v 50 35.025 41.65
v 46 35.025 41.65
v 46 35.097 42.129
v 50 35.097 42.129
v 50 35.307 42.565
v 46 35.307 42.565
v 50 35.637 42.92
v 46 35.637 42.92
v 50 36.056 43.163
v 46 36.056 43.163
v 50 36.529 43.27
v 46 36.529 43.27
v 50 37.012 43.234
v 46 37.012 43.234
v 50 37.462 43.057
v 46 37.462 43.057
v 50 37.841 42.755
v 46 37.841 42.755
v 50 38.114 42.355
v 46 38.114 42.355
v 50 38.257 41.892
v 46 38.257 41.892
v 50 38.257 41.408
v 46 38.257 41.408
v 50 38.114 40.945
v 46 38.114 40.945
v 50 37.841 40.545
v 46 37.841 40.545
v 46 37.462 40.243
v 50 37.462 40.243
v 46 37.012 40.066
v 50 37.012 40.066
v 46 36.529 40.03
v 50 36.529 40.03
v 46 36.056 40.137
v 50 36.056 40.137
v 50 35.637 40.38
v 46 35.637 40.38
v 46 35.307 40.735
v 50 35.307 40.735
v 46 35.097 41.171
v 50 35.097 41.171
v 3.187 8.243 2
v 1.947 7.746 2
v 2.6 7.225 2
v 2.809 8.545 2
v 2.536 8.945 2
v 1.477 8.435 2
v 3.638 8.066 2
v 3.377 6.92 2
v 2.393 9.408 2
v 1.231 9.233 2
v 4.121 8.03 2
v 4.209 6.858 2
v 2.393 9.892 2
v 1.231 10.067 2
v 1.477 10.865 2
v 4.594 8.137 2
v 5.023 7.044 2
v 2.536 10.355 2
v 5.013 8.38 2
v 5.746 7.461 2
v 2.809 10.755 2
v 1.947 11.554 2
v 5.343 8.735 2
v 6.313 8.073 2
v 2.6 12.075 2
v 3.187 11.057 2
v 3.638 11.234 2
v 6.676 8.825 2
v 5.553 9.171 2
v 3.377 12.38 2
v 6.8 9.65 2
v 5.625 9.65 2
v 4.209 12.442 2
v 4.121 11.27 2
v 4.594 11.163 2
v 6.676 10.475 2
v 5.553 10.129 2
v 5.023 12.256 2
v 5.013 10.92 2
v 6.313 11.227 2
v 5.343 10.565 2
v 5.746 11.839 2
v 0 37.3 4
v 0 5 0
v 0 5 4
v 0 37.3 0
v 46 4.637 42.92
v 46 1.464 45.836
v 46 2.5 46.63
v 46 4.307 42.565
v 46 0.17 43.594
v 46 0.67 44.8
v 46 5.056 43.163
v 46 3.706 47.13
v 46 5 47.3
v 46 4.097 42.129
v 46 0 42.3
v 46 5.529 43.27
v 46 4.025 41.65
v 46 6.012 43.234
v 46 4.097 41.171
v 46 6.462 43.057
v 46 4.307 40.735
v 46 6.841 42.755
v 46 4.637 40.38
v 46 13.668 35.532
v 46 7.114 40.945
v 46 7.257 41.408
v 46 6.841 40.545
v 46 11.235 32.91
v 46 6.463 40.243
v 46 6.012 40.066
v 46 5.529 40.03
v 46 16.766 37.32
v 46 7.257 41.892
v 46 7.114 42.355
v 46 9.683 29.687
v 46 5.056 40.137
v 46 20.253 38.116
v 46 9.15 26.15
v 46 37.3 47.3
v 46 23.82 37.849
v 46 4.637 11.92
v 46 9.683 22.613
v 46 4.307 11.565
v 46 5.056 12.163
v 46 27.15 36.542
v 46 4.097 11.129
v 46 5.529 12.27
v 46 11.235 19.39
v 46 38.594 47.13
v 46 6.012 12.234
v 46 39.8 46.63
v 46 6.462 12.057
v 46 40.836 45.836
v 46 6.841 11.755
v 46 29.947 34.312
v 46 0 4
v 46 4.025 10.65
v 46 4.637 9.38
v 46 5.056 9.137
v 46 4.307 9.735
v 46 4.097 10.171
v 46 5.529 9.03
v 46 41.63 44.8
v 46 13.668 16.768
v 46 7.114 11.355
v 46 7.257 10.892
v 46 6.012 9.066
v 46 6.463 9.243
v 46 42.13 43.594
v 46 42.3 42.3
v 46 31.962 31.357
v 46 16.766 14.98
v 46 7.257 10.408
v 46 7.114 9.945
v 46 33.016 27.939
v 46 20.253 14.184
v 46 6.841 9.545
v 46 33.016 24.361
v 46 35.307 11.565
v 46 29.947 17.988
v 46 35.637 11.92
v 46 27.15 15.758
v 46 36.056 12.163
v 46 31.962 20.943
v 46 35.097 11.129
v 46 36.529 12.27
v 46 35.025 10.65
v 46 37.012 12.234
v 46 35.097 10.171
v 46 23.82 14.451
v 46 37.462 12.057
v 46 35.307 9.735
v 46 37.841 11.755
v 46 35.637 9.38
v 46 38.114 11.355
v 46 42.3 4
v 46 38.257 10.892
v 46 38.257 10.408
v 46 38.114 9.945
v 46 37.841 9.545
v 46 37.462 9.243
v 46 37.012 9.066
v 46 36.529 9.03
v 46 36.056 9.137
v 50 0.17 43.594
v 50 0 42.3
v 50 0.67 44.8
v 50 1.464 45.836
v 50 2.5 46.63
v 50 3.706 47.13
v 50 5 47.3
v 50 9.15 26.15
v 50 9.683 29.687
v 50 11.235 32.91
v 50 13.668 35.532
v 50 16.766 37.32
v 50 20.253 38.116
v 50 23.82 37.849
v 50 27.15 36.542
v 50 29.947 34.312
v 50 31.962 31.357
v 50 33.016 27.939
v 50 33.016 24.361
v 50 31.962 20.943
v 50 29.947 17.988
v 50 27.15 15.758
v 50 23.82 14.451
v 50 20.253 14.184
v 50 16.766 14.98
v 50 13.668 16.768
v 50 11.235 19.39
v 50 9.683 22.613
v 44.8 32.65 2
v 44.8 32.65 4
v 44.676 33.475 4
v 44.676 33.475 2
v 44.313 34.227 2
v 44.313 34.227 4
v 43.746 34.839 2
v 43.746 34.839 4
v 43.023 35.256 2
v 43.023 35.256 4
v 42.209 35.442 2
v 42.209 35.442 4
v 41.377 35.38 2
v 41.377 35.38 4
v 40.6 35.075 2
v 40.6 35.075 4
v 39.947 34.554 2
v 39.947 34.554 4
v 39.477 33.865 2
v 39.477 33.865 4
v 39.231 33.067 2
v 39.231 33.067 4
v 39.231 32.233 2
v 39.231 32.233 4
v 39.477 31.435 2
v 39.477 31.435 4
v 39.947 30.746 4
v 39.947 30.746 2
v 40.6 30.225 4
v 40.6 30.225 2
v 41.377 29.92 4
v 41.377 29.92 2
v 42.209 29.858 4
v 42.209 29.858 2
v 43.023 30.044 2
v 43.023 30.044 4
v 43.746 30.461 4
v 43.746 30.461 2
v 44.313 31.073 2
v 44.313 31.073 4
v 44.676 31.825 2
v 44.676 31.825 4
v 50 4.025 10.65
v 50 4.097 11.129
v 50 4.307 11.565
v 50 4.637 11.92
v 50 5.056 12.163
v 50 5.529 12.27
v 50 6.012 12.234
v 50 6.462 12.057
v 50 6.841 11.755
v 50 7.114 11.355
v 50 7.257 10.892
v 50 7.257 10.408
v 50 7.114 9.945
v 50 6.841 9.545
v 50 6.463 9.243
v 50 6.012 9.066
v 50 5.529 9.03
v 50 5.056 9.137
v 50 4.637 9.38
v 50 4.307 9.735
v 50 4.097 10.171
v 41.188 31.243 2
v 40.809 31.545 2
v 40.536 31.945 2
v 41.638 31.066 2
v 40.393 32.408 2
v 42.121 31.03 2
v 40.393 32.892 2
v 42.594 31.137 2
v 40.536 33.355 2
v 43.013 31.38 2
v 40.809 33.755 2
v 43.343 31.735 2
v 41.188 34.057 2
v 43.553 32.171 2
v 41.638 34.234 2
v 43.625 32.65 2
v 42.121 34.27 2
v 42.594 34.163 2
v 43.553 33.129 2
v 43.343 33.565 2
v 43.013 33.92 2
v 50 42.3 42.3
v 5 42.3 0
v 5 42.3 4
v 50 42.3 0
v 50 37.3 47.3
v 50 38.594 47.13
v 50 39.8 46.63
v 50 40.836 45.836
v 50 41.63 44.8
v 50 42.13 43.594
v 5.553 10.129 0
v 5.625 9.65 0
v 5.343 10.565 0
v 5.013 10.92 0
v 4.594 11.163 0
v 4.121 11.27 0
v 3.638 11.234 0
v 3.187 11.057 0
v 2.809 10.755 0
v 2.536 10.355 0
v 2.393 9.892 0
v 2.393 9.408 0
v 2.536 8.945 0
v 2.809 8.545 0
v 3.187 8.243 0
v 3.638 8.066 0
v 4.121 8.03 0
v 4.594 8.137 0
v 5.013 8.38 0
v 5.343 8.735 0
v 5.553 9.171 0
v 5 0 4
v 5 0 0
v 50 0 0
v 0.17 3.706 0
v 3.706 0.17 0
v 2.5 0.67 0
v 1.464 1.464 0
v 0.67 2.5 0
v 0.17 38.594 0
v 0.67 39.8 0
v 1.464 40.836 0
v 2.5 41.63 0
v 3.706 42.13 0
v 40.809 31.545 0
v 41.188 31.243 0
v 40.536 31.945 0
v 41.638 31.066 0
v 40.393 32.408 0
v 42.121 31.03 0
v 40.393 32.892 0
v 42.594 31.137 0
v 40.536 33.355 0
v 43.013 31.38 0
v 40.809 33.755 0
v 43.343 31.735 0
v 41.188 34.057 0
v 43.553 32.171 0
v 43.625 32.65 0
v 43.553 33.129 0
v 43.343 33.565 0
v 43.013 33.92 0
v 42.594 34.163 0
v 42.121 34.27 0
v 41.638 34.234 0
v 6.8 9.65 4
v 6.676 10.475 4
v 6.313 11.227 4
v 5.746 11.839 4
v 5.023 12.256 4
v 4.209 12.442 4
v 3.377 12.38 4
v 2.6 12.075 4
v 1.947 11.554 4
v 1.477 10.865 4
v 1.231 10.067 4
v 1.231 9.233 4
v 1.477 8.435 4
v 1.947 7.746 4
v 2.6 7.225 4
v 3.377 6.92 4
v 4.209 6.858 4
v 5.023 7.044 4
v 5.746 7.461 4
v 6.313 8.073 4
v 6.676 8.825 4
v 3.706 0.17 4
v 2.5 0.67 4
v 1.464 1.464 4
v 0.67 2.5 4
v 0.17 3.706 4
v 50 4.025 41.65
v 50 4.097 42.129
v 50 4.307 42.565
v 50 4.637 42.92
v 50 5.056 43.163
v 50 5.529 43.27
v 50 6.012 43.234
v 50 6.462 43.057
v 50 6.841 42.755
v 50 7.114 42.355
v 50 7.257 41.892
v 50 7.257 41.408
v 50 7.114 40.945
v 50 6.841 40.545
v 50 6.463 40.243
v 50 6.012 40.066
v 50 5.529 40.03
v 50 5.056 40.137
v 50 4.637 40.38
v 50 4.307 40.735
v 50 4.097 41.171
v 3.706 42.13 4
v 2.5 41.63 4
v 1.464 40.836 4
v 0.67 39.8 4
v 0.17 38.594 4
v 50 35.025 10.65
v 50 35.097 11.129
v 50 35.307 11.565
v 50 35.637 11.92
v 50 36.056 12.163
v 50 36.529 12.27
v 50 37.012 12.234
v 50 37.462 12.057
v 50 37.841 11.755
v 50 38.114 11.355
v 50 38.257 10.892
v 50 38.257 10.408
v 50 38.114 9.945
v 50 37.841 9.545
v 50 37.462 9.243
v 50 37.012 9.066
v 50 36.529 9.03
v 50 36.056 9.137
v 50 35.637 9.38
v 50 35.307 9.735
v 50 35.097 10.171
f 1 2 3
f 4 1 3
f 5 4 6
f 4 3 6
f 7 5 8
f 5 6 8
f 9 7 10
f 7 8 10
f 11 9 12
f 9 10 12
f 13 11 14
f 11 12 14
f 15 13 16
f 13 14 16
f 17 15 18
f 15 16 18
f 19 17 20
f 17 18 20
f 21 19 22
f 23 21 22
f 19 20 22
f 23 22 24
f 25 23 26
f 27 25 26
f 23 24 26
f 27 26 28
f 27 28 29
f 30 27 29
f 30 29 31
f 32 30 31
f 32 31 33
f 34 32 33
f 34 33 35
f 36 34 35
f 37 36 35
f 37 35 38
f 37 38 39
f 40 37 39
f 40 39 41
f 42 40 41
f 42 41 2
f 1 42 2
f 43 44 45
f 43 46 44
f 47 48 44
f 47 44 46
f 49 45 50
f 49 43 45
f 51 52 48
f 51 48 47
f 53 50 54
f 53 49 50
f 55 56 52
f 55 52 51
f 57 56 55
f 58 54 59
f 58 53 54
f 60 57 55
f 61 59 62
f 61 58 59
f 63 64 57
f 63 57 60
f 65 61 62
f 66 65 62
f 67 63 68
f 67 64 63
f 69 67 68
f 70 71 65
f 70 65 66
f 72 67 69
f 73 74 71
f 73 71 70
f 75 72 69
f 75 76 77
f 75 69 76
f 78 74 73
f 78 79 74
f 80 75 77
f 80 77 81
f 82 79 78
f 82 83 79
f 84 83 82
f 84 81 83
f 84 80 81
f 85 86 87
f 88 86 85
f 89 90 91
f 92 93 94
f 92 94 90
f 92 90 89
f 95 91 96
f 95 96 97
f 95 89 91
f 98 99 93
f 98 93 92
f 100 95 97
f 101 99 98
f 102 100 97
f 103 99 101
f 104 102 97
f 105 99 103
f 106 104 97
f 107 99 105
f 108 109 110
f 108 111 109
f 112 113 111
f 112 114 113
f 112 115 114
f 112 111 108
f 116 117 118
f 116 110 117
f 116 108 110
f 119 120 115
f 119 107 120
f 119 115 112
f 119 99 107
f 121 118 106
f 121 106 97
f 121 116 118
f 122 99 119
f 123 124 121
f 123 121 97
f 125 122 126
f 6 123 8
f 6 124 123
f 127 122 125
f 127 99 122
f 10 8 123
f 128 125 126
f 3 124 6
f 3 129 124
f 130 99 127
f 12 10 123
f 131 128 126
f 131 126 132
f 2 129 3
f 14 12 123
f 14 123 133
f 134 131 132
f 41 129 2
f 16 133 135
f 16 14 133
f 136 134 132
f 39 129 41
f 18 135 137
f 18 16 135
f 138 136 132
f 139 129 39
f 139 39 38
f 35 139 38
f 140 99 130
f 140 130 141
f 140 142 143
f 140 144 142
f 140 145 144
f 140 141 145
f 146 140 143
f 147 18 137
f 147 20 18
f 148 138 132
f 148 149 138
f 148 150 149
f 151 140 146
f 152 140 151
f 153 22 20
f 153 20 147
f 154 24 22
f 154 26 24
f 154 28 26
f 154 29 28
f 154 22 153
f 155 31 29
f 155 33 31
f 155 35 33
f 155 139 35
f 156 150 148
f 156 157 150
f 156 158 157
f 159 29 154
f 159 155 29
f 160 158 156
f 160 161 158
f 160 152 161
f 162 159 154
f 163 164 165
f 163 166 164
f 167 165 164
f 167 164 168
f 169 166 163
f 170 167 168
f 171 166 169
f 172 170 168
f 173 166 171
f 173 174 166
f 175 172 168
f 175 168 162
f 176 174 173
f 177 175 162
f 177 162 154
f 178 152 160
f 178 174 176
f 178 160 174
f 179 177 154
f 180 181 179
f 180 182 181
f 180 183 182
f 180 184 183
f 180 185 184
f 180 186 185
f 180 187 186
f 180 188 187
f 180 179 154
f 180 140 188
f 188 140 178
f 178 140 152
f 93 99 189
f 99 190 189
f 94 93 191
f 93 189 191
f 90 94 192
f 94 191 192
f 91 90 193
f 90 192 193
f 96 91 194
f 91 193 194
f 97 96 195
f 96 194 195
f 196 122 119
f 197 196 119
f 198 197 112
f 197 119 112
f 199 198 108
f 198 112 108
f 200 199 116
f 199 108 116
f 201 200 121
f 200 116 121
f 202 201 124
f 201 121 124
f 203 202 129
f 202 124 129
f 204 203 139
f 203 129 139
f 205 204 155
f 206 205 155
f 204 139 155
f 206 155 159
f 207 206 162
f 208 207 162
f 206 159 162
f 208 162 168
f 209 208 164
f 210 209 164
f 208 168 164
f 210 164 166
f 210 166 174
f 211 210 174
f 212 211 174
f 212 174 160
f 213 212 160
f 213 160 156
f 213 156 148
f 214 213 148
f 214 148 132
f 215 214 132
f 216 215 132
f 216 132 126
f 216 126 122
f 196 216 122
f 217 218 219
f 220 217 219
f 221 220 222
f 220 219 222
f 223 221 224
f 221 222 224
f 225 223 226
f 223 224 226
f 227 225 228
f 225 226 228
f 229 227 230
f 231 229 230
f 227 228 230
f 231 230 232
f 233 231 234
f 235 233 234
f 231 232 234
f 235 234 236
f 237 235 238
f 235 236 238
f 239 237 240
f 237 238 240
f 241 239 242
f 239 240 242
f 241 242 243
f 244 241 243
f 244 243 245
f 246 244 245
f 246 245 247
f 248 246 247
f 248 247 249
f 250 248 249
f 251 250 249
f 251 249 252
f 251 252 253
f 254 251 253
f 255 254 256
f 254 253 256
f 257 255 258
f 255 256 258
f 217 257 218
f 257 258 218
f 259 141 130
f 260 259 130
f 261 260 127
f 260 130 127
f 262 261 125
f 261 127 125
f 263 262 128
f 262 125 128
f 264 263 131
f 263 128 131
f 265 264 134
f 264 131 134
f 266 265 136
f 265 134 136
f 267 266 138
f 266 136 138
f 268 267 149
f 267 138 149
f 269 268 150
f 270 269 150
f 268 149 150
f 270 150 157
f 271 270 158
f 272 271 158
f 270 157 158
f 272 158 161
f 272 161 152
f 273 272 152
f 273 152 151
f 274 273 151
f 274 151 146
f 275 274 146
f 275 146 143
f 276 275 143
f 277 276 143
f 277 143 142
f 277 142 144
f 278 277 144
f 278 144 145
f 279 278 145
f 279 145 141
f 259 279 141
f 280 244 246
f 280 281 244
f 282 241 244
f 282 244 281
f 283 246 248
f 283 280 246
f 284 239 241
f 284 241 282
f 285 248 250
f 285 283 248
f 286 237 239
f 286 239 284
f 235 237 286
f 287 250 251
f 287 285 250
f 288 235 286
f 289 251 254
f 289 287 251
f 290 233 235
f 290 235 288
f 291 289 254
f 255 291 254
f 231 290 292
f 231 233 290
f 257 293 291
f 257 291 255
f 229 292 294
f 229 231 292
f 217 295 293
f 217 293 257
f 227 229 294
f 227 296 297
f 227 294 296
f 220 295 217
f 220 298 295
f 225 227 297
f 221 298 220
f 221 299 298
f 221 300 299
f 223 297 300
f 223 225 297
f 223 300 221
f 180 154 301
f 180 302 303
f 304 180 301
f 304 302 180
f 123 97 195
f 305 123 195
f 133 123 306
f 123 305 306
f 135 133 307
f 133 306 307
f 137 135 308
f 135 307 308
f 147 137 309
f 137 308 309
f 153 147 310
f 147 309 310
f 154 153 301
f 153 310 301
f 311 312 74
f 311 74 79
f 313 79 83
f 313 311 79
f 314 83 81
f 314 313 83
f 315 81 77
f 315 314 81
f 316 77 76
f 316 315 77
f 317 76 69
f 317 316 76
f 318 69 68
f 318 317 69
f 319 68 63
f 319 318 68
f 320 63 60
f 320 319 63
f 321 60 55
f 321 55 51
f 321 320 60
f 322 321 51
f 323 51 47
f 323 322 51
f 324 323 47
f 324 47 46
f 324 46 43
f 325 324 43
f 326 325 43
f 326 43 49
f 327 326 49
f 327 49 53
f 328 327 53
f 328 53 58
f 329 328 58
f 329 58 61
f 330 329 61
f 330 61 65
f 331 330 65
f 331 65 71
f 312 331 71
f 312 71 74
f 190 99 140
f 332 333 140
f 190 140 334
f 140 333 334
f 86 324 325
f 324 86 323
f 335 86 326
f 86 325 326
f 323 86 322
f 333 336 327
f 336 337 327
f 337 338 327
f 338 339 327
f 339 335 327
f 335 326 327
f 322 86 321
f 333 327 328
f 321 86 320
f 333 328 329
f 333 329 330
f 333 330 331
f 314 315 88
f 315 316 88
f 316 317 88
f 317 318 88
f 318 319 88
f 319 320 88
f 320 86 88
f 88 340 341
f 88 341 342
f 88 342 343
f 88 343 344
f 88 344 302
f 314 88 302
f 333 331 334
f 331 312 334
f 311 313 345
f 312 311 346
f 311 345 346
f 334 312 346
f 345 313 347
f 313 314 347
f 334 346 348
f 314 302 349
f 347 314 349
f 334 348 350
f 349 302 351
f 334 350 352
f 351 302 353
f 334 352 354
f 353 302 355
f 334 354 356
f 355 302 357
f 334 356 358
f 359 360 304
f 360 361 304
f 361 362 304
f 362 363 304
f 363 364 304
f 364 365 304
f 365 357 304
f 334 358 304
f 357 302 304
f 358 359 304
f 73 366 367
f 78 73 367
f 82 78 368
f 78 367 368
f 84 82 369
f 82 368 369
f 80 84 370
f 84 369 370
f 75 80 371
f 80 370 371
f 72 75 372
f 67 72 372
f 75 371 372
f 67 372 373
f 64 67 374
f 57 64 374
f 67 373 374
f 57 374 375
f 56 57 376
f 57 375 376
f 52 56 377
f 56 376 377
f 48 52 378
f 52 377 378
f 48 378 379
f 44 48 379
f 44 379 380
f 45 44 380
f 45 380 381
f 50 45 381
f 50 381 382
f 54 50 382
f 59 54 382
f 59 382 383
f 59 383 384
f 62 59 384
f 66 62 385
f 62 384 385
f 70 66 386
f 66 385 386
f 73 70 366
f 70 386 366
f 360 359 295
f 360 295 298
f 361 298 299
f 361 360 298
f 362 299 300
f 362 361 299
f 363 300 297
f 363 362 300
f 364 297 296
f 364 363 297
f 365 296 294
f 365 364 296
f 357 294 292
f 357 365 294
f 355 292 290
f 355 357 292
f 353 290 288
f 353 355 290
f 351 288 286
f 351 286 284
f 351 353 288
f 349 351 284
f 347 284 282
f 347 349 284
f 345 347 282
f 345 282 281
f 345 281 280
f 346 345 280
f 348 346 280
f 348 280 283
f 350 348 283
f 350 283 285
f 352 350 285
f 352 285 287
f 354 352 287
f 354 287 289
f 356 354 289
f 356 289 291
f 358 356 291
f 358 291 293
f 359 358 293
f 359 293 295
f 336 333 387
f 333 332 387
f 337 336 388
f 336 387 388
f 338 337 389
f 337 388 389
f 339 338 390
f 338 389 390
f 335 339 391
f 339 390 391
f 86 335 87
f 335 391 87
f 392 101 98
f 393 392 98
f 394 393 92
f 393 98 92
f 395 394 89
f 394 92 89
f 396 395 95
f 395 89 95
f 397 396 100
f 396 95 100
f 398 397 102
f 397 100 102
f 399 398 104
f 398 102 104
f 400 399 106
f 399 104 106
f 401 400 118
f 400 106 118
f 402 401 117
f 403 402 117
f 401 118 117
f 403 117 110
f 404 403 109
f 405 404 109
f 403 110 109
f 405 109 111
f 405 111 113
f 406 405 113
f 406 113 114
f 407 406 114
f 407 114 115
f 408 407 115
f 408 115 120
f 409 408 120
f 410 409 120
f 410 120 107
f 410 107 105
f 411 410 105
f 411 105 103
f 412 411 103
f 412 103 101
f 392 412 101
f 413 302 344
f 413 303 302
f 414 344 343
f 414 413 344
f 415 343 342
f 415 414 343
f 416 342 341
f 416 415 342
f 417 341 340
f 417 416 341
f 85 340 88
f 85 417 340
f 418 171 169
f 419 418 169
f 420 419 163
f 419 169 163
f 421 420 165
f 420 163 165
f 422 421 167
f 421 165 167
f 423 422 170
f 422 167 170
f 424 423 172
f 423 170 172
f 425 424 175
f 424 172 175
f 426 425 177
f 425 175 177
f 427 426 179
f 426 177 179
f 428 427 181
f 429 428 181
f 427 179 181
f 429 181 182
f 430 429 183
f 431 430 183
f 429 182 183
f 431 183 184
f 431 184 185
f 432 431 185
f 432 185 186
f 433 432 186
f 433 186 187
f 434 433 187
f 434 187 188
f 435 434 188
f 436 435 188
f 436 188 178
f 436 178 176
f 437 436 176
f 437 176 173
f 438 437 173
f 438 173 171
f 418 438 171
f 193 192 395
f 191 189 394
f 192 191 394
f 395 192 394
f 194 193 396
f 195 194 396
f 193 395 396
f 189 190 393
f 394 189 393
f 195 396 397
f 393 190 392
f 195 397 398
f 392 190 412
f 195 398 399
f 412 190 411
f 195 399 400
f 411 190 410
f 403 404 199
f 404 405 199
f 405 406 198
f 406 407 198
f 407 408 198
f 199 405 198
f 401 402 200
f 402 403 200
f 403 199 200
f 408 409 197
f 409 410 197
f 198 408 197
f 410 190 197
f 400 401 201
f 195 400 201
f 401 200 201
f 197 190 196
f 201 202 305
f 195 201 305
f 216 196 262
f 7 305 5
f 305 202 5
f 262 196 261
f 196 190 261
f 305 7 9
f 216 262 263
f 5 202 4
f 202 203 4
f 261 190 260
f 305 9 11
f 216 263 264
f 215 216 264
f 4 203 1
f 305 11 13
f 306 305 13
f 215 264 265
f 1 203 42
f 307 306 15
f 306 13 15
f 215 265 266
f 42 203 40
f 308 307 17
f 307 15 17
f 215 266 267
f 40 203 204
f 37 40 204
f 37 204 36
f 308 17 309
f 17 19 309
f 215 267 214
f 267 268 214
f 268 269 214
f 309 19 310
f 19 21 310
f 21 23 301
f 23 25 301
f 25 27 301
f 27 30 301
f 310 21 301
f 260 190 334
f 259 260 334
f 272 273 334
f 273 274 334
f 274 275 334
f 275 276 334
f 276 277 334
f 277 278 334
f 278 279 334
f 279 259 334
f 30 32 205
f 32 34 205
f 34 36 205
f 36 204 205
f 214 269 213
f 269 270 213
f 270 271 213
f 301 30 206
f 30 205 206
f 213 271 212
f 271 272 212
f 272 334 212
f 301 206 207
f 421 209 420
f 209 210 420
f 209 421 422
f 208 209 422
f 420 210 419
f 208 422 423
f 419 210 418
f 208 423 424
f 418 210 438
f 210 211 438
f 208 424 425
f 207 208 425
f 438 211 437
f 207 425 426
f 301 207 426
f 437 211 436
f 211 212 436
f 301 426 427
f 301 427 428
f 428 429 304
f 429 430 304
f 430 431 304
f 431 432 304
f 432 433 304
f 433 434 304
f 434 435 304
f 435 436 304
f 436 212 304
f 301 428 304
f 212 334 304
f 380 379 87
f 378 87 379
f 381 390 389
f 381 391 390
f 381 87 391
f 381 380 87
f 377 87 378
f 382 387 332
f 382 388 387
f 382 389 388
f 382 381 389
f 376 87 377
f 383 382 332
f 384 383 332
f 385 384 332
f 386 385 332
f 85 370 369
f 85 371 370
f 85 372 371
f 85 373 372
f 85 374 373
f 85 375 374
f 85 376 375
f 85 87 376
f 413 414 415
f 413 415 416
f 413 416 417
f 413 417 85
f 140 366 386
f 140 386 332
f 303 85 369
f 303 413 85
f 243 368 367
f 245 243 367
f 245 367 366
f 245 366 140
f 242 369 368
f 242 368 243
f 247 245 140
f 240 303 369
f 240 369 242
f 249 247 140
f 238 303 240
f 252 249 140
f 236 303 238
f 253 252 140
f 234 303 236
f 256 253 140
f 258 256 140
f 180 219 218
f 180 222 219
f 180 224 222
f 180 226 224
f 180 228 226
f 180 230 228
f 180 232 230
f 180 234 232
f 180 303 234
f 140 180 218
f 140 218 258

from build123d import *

# Parameters (mm, degrees)
F0_W     = 50
F0_H     = 42.3
F0_R     = 2.8
F0_R_2   = 1.625
F1_DEPTH = 4
F2_R     = 2.8
F2_R_2   = 1.625
F3_DEPTH = 2
F4_W     = 4
F4_H     = 42.3
F5_DEPTH = 43.3
F6_R     = 12
F6_R_2   = 1.625
F7_DEPTH = 25
F8_R     = 5


with BuildPart() as f1:
    # F0 (on Top) → F1 (new body)
    with BuildSketch(Plane.XY):
        with Locations((25, 21.15)):
            Rectangle(F0_W, F0_H)
        with Locations((4, 9.65)):
            Circle(F0_R, mode=Mode.SUBTRACT)
        with Locations((42, 32.65)):
            Circle(F0_R, mode=Mode.SUBTRACT)
        with Locations((42, 32.65)):
            Circle(F0_R)
        with Locations((42, 32.65)):
            Circle(F0_R_2, mode=Mode.SUBTRACT)
        with Locations((4, 9.65)):
            Circle(F0_R)
        with Locations((4, 9.65)):
            Circle(F0_R_2, mode=Mode.SUBTRACT)
    extrude(amount=F1_DEPTH)

    # F2 (on face) → F3 (cut)
    with BuildSketch(Plane.XY.offset(4)):
        with Locations((4, 9.65)):
            Circle(F2_R)
        with Locations((4, 9.65)):
            Circle(F2_R_2, mode=Mode.SUBTRACT)
        with Locations((42, 32.65)):
            Circle(F2_R)
        with Locations((42, 32.65)):
            Circle(F2_R_2, mode=Mode.SUBTRACT)
    extrude(amount=-F3_DEPTH, mode=Mode.SUBTRACT)

    # F4 (on face) → F5 (join)
    with BuildSketch(Plane.XY.offset(4)):
        with Locations((48, 21.15)):
            Rectangle(F4_W, F4_H)
    extrude(amount=F5_DEPTH)

    # F6 (on face) → F7 (cut)
    with BuildSketch(Plane(origin=(46, 0, 0), x_dir=(0, -1, 0), z_dir=(-1, 0, 0))):
        with Locations((-21.15, 26.15)):
            Circle(F6_R)
        with Locations((-36.65, 41.65)):
            Circle(F6_R_2)
        with Locations((-5.65, 41.65)):
            Circle(F6_R_2)
        with Locations((-5.65, 10.65)):
            Circle(F6_R_2)
        with Locations((-36.65, 10.65)):
            Circle(F6_R_2)
    extrude(amount=-F7_DEPTH, mode=Mode.SUBTRACT)

    # F8
    f8_edges = [f1.edges().sort_by_distance(p)[0] for p in [
        (0, 0, 2),
        (0, 42.3, 2),
        (48, 42.3, 47.3),
        (48, 0, 47.3),
    ]]
    fillet(f8_edges, radius=F8_R)


solid = f1.part
